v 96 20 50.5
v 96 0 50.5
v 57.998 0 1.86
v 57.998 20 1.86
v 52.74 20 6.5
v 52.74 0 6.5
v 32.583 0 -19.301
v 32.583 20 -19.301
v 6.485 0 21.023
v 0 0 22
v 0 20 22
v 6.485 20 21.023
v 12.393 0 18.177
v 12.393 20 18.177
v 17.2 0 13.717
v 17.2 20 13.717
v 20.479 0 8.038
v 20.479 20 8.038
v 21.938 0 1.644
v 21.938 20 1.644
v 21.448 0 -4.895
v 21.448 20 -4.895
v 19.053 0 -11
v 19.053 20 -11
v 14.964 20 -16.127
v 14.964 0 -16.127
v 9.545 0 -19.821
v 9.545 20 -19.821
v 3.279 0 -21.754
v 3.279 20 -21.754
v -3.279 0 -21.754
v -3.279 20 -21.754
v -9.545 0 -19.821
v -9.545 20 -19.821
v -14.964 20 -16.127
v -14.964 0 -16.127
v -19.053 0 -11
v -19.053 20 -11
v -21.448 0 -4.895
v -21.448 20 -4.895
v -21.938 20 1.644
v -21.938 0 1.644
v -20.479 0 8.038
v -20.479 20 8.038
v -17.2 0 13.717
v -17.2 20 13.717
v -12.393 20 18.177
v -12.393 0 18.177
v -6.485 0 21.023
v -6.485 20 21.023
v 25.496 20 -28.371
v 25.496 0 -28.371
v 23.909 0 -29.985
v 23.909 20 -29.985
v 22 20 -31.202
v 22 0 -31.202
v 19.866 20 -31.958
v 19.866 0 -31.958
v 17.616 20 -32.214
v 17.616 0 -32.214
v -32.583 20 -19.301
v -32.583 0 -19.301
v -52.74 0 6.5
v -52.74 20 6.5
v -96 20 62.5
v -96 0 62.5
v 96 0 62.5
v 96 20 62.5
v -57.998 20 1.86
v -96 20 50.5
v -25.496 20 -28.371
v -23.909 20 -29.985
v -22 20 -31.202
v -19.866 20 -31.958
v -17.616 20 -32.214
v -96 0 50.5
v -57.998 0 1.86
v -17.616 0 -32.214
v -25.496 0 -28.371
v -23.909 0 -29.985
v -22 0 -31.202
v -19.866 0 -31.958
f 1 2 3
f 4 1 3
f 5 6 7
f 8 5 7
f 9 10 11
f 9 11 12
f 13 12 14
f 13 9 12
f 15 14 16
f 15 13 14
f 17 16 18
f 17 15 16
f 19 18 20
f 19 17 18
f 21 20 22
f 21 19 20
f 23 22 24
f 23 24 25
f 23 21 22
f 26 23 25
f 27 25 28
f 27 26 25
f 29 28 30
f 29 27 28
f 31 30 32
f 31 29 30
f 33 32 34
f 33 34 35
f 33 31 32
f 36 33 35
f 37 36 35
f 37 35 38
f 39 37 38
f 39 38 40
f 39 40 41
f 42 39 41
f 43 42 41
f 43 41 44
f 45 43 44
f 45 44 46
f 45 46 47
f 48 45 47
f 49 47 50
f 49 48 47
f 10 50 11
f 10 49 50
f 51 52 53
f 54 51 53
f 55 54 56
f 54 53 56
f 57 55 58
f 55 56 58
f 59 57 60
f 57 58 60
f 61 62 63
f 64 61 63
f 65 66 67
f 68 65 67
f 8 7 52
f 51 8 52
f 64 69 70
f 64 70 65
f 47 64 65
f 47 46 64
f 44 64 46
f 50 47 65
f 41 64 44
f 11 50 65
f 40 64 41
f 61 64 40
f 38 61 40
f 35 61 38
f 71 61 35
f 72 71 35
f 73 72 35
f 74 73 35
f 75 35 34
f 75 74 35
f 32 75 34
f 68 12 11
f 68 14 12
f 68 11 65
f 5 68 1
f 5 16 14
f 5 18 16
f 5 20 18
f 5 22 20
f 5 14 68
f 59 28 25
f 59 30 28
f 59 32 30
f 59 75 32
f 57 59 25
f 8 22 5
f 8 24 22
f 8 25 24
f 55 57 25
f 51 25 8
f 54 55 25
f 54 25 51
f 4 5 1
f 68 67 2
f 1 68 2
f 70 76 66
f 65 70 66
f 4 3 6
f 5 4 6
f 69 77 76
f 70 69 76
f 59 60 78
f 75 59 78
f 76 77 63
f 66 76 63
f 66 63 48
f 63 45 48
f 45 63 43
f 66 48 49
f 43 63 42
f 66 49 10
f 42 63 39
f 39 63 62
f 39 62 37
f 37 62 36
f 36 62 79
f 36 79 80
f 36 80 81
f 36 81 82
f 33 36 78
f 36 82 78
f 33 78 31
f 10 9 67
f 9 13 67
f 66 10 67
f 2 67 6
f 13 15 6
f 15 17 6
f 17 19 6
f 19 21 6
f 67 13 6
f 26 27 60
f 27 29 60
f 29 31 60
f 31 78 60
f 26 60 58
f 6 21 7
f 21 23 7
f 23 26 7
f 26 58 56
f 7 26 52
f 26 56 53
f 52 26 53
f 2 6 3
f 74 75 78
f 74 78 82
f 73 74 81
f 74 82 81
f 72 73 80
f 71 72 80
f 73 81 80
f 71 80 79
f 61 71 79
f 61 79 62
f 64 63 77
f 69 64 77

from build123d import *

# Parameters (mm, degrees)
SKETCH1_R           = 22
BOSS_EXTRUDE1_DEPTH = 20


with BuildPart() as part:
    # Sketch1 → Boss-Extrude1 (new body)
    # profile 1 of 4: a face of its own
    with BuildSketch(Plane(origin=(0, 0, 0), x_dir=(1, 0, 0), z_dir=(0, 1, 0))):
        with BuildLine():
            Line((-96, -62.5), (96, -62.5))
            Line((96, -62.5), (96, -50.5))
            Line((96, -50.5), (57.998267127, -1.86))
            Line((57.998267127, -1.86), (52.740304928, -6.5))
            Line((52.740304928, -6.5), (32.582594335, 19.300692998))
            Line((32.582594335, 19.300692998), (25.496396068, 28.370613174))
            ThreePointArc((25.496396068, 28.370613174), (22, 31.201938883), (17.616288532, 32.21399842))
            Line((17.616288532, 32.21399842), (-17.616288532, 32.21399842))
            ThreePointArc((-17.616288532, 32.21399842), (-22, 31.201938883), (-25.496396068, 28.370613174))
            Line((-25.496396068, 28.370613174), (-32.582594335, 19.300692998))
            Line((-32.582594335, 19.300692998), (-52.740304928, -6.5))
            Line((-52.740304928, -6.5), (-57.998267127, -1.86))
            Line((-57.998267127, -1.86), (-96, -50.5))
            Line((-96, -50.5), (-96, -62.5))
        make_face()
        with Locations(Location((0, 0, 0), (0, 0, 270))):
            Circle(SKETCH1_R, mode=Mode.SUBTRACT)
    # profile 2 of 4: a face of its own
    with BuildSketch(Plane(origin=(0, 0, 0), x_dir=(1, 0, 0), z_dir=(0, 1, 0))):
        with BuildLine():
            Line((-96, -62.5), (96, -62.5))
            Line((96, -62.5), (96, -50.5))
            Line((96, -50.5), (57.998267127, -1.86))
            Line((57.998267127, -1.86), (52.740304928, -6.5))
            Line((52.740304928, -6.5), (32.582594335, 19.300692998))
            Line((32.582594335, 19.300692998), (25.496396068, 28.370613174))
            ThreePointArc((25.496396068, 28.370613174), (22, 31.201938883), (17.616288532, 32.21399842))
            Line((17.616288532, 32.21399842), (-17.616288532, 32.21399842))
            ThreePointArc((-17.616288532, 32.21399842), (-22, 31.201938883), (-25.496396068, 28.370613174))
            Line((-25.496396068, 28.370613174), (-32.582594335, 19.300692998))
            Line((-32.582594335, 19.300692998), (-52.740304928, -6.5))
            Line((-52.740304928, -6.5), (-57.998267127, -1.86))
            Line((-57.998267127, -1.86), (-96, -50.5))
            Line((-96, -50.5), (-96, -62.5))
        make_face()
        with Locations(Location((0, 0, 0), (0, 0, 270))):
            Circle(SKETCH1_R, mode=Mode.SUBTRACT)
    # profile 3 of 4: a face of its own
    with BuildSketch(Plane(origin=(0, 0, 0), x_dir=(1, 0, 0), z_dir=(0, 1, 0))):
        with BuildLine():
            Line((-96, -62.5), (96, -62.5))
            Line((96, -62.5), (96, -50.5))
            Line((96, -50.5), (57.998267127, -1.86))
            Line((57.998267127, -1.86), (52.740304928, -6.5))
            Line((52.740304928, -6.5), (32.582594335, 19.300692998))
            Line((32.582594335, 19.300692998), (25.496396068, 28.370613174))
            ThreePointArc((25.496396068, 28.370613174), (22, 31.201938883), (17.616288532, 32.21399842))
            Line((17.616288532, 32.21399842), (-17.616288532, 32.21399842))
            ThreePointArc((-17.616288532, 32.21399842), (-22, 31.201938883), (-25.496396068, 28.370613174))
            Line((-25.496396068, 28.370613174), (-32.582594335, 19.300692998))
            Line((-32.582594335, 19.300692998), (-52.740304928, -6.5))
            Line((-52.740304928, -6.5), (-57.998267127, -1.86))
            Line((-57.998267127, -1.86), (-96, -50.5))
            Line((-96, -50.5), (-96, -62.5))
        make_face()
        with Locations(Location((0, 0, 0), (0, 0, 270))):
            Circle(SKETCH1_R, mode=Mode.SUBTRACT)
    # profile 4 of 4: a face of its own
    with BuildSketch(Plane(origin=(0, 0, 0), x_dir=(1, 0, 0), z_dir=(0, 1, 0))):
        with BuildLine():
            Line((-96, -62.5), (96, -62.5))
            Line((96, -62.5), (96, -50.5))
            Line((96, -50.5), (57.998267127, -1.86))
            Line((57.998267127, -1.86), (52.740304928, -6.5))
            Line((52.740304928, -6.5), (32.582594335, 19.300692998))
            Line((32.582594335, 19.300692998), (25.496396068, 28.370613174))
            ThreePointArc((25.496396068, 28.370613174), (22, 31.201938883), (17.616288532, 32.21399842))
            Line((17.616288532, 32.21399842), (-17.616288532, 32.21399842))
            ThreePointArc((-17.616288532, 32.21399842), (-22, 31.201938883), (-25.496396068, 28.370613174))
            Line((-25.496396068, 28.370613174), (-32.582594335, 19.300692998))
            Line((-32.582594335, 19.300692998), (-52.740304928, -6.5))
            Line((-52.740304928, -6.5), (-57.998267127, -1.86))
            Line((-57.998267127, -1.86), (-96, -50.5))
            Line((-96, -50.5), (-96, -62.5))
        make_face()
        with Locations(Location((0, 0, 0), (0, 0, 270))):
            Circle(SKETCH1_R, mode=Mode.SUBTRACT)
    extrude(amount=BOSS_EXTRUDE1_DEPTH)


solid = part.part
